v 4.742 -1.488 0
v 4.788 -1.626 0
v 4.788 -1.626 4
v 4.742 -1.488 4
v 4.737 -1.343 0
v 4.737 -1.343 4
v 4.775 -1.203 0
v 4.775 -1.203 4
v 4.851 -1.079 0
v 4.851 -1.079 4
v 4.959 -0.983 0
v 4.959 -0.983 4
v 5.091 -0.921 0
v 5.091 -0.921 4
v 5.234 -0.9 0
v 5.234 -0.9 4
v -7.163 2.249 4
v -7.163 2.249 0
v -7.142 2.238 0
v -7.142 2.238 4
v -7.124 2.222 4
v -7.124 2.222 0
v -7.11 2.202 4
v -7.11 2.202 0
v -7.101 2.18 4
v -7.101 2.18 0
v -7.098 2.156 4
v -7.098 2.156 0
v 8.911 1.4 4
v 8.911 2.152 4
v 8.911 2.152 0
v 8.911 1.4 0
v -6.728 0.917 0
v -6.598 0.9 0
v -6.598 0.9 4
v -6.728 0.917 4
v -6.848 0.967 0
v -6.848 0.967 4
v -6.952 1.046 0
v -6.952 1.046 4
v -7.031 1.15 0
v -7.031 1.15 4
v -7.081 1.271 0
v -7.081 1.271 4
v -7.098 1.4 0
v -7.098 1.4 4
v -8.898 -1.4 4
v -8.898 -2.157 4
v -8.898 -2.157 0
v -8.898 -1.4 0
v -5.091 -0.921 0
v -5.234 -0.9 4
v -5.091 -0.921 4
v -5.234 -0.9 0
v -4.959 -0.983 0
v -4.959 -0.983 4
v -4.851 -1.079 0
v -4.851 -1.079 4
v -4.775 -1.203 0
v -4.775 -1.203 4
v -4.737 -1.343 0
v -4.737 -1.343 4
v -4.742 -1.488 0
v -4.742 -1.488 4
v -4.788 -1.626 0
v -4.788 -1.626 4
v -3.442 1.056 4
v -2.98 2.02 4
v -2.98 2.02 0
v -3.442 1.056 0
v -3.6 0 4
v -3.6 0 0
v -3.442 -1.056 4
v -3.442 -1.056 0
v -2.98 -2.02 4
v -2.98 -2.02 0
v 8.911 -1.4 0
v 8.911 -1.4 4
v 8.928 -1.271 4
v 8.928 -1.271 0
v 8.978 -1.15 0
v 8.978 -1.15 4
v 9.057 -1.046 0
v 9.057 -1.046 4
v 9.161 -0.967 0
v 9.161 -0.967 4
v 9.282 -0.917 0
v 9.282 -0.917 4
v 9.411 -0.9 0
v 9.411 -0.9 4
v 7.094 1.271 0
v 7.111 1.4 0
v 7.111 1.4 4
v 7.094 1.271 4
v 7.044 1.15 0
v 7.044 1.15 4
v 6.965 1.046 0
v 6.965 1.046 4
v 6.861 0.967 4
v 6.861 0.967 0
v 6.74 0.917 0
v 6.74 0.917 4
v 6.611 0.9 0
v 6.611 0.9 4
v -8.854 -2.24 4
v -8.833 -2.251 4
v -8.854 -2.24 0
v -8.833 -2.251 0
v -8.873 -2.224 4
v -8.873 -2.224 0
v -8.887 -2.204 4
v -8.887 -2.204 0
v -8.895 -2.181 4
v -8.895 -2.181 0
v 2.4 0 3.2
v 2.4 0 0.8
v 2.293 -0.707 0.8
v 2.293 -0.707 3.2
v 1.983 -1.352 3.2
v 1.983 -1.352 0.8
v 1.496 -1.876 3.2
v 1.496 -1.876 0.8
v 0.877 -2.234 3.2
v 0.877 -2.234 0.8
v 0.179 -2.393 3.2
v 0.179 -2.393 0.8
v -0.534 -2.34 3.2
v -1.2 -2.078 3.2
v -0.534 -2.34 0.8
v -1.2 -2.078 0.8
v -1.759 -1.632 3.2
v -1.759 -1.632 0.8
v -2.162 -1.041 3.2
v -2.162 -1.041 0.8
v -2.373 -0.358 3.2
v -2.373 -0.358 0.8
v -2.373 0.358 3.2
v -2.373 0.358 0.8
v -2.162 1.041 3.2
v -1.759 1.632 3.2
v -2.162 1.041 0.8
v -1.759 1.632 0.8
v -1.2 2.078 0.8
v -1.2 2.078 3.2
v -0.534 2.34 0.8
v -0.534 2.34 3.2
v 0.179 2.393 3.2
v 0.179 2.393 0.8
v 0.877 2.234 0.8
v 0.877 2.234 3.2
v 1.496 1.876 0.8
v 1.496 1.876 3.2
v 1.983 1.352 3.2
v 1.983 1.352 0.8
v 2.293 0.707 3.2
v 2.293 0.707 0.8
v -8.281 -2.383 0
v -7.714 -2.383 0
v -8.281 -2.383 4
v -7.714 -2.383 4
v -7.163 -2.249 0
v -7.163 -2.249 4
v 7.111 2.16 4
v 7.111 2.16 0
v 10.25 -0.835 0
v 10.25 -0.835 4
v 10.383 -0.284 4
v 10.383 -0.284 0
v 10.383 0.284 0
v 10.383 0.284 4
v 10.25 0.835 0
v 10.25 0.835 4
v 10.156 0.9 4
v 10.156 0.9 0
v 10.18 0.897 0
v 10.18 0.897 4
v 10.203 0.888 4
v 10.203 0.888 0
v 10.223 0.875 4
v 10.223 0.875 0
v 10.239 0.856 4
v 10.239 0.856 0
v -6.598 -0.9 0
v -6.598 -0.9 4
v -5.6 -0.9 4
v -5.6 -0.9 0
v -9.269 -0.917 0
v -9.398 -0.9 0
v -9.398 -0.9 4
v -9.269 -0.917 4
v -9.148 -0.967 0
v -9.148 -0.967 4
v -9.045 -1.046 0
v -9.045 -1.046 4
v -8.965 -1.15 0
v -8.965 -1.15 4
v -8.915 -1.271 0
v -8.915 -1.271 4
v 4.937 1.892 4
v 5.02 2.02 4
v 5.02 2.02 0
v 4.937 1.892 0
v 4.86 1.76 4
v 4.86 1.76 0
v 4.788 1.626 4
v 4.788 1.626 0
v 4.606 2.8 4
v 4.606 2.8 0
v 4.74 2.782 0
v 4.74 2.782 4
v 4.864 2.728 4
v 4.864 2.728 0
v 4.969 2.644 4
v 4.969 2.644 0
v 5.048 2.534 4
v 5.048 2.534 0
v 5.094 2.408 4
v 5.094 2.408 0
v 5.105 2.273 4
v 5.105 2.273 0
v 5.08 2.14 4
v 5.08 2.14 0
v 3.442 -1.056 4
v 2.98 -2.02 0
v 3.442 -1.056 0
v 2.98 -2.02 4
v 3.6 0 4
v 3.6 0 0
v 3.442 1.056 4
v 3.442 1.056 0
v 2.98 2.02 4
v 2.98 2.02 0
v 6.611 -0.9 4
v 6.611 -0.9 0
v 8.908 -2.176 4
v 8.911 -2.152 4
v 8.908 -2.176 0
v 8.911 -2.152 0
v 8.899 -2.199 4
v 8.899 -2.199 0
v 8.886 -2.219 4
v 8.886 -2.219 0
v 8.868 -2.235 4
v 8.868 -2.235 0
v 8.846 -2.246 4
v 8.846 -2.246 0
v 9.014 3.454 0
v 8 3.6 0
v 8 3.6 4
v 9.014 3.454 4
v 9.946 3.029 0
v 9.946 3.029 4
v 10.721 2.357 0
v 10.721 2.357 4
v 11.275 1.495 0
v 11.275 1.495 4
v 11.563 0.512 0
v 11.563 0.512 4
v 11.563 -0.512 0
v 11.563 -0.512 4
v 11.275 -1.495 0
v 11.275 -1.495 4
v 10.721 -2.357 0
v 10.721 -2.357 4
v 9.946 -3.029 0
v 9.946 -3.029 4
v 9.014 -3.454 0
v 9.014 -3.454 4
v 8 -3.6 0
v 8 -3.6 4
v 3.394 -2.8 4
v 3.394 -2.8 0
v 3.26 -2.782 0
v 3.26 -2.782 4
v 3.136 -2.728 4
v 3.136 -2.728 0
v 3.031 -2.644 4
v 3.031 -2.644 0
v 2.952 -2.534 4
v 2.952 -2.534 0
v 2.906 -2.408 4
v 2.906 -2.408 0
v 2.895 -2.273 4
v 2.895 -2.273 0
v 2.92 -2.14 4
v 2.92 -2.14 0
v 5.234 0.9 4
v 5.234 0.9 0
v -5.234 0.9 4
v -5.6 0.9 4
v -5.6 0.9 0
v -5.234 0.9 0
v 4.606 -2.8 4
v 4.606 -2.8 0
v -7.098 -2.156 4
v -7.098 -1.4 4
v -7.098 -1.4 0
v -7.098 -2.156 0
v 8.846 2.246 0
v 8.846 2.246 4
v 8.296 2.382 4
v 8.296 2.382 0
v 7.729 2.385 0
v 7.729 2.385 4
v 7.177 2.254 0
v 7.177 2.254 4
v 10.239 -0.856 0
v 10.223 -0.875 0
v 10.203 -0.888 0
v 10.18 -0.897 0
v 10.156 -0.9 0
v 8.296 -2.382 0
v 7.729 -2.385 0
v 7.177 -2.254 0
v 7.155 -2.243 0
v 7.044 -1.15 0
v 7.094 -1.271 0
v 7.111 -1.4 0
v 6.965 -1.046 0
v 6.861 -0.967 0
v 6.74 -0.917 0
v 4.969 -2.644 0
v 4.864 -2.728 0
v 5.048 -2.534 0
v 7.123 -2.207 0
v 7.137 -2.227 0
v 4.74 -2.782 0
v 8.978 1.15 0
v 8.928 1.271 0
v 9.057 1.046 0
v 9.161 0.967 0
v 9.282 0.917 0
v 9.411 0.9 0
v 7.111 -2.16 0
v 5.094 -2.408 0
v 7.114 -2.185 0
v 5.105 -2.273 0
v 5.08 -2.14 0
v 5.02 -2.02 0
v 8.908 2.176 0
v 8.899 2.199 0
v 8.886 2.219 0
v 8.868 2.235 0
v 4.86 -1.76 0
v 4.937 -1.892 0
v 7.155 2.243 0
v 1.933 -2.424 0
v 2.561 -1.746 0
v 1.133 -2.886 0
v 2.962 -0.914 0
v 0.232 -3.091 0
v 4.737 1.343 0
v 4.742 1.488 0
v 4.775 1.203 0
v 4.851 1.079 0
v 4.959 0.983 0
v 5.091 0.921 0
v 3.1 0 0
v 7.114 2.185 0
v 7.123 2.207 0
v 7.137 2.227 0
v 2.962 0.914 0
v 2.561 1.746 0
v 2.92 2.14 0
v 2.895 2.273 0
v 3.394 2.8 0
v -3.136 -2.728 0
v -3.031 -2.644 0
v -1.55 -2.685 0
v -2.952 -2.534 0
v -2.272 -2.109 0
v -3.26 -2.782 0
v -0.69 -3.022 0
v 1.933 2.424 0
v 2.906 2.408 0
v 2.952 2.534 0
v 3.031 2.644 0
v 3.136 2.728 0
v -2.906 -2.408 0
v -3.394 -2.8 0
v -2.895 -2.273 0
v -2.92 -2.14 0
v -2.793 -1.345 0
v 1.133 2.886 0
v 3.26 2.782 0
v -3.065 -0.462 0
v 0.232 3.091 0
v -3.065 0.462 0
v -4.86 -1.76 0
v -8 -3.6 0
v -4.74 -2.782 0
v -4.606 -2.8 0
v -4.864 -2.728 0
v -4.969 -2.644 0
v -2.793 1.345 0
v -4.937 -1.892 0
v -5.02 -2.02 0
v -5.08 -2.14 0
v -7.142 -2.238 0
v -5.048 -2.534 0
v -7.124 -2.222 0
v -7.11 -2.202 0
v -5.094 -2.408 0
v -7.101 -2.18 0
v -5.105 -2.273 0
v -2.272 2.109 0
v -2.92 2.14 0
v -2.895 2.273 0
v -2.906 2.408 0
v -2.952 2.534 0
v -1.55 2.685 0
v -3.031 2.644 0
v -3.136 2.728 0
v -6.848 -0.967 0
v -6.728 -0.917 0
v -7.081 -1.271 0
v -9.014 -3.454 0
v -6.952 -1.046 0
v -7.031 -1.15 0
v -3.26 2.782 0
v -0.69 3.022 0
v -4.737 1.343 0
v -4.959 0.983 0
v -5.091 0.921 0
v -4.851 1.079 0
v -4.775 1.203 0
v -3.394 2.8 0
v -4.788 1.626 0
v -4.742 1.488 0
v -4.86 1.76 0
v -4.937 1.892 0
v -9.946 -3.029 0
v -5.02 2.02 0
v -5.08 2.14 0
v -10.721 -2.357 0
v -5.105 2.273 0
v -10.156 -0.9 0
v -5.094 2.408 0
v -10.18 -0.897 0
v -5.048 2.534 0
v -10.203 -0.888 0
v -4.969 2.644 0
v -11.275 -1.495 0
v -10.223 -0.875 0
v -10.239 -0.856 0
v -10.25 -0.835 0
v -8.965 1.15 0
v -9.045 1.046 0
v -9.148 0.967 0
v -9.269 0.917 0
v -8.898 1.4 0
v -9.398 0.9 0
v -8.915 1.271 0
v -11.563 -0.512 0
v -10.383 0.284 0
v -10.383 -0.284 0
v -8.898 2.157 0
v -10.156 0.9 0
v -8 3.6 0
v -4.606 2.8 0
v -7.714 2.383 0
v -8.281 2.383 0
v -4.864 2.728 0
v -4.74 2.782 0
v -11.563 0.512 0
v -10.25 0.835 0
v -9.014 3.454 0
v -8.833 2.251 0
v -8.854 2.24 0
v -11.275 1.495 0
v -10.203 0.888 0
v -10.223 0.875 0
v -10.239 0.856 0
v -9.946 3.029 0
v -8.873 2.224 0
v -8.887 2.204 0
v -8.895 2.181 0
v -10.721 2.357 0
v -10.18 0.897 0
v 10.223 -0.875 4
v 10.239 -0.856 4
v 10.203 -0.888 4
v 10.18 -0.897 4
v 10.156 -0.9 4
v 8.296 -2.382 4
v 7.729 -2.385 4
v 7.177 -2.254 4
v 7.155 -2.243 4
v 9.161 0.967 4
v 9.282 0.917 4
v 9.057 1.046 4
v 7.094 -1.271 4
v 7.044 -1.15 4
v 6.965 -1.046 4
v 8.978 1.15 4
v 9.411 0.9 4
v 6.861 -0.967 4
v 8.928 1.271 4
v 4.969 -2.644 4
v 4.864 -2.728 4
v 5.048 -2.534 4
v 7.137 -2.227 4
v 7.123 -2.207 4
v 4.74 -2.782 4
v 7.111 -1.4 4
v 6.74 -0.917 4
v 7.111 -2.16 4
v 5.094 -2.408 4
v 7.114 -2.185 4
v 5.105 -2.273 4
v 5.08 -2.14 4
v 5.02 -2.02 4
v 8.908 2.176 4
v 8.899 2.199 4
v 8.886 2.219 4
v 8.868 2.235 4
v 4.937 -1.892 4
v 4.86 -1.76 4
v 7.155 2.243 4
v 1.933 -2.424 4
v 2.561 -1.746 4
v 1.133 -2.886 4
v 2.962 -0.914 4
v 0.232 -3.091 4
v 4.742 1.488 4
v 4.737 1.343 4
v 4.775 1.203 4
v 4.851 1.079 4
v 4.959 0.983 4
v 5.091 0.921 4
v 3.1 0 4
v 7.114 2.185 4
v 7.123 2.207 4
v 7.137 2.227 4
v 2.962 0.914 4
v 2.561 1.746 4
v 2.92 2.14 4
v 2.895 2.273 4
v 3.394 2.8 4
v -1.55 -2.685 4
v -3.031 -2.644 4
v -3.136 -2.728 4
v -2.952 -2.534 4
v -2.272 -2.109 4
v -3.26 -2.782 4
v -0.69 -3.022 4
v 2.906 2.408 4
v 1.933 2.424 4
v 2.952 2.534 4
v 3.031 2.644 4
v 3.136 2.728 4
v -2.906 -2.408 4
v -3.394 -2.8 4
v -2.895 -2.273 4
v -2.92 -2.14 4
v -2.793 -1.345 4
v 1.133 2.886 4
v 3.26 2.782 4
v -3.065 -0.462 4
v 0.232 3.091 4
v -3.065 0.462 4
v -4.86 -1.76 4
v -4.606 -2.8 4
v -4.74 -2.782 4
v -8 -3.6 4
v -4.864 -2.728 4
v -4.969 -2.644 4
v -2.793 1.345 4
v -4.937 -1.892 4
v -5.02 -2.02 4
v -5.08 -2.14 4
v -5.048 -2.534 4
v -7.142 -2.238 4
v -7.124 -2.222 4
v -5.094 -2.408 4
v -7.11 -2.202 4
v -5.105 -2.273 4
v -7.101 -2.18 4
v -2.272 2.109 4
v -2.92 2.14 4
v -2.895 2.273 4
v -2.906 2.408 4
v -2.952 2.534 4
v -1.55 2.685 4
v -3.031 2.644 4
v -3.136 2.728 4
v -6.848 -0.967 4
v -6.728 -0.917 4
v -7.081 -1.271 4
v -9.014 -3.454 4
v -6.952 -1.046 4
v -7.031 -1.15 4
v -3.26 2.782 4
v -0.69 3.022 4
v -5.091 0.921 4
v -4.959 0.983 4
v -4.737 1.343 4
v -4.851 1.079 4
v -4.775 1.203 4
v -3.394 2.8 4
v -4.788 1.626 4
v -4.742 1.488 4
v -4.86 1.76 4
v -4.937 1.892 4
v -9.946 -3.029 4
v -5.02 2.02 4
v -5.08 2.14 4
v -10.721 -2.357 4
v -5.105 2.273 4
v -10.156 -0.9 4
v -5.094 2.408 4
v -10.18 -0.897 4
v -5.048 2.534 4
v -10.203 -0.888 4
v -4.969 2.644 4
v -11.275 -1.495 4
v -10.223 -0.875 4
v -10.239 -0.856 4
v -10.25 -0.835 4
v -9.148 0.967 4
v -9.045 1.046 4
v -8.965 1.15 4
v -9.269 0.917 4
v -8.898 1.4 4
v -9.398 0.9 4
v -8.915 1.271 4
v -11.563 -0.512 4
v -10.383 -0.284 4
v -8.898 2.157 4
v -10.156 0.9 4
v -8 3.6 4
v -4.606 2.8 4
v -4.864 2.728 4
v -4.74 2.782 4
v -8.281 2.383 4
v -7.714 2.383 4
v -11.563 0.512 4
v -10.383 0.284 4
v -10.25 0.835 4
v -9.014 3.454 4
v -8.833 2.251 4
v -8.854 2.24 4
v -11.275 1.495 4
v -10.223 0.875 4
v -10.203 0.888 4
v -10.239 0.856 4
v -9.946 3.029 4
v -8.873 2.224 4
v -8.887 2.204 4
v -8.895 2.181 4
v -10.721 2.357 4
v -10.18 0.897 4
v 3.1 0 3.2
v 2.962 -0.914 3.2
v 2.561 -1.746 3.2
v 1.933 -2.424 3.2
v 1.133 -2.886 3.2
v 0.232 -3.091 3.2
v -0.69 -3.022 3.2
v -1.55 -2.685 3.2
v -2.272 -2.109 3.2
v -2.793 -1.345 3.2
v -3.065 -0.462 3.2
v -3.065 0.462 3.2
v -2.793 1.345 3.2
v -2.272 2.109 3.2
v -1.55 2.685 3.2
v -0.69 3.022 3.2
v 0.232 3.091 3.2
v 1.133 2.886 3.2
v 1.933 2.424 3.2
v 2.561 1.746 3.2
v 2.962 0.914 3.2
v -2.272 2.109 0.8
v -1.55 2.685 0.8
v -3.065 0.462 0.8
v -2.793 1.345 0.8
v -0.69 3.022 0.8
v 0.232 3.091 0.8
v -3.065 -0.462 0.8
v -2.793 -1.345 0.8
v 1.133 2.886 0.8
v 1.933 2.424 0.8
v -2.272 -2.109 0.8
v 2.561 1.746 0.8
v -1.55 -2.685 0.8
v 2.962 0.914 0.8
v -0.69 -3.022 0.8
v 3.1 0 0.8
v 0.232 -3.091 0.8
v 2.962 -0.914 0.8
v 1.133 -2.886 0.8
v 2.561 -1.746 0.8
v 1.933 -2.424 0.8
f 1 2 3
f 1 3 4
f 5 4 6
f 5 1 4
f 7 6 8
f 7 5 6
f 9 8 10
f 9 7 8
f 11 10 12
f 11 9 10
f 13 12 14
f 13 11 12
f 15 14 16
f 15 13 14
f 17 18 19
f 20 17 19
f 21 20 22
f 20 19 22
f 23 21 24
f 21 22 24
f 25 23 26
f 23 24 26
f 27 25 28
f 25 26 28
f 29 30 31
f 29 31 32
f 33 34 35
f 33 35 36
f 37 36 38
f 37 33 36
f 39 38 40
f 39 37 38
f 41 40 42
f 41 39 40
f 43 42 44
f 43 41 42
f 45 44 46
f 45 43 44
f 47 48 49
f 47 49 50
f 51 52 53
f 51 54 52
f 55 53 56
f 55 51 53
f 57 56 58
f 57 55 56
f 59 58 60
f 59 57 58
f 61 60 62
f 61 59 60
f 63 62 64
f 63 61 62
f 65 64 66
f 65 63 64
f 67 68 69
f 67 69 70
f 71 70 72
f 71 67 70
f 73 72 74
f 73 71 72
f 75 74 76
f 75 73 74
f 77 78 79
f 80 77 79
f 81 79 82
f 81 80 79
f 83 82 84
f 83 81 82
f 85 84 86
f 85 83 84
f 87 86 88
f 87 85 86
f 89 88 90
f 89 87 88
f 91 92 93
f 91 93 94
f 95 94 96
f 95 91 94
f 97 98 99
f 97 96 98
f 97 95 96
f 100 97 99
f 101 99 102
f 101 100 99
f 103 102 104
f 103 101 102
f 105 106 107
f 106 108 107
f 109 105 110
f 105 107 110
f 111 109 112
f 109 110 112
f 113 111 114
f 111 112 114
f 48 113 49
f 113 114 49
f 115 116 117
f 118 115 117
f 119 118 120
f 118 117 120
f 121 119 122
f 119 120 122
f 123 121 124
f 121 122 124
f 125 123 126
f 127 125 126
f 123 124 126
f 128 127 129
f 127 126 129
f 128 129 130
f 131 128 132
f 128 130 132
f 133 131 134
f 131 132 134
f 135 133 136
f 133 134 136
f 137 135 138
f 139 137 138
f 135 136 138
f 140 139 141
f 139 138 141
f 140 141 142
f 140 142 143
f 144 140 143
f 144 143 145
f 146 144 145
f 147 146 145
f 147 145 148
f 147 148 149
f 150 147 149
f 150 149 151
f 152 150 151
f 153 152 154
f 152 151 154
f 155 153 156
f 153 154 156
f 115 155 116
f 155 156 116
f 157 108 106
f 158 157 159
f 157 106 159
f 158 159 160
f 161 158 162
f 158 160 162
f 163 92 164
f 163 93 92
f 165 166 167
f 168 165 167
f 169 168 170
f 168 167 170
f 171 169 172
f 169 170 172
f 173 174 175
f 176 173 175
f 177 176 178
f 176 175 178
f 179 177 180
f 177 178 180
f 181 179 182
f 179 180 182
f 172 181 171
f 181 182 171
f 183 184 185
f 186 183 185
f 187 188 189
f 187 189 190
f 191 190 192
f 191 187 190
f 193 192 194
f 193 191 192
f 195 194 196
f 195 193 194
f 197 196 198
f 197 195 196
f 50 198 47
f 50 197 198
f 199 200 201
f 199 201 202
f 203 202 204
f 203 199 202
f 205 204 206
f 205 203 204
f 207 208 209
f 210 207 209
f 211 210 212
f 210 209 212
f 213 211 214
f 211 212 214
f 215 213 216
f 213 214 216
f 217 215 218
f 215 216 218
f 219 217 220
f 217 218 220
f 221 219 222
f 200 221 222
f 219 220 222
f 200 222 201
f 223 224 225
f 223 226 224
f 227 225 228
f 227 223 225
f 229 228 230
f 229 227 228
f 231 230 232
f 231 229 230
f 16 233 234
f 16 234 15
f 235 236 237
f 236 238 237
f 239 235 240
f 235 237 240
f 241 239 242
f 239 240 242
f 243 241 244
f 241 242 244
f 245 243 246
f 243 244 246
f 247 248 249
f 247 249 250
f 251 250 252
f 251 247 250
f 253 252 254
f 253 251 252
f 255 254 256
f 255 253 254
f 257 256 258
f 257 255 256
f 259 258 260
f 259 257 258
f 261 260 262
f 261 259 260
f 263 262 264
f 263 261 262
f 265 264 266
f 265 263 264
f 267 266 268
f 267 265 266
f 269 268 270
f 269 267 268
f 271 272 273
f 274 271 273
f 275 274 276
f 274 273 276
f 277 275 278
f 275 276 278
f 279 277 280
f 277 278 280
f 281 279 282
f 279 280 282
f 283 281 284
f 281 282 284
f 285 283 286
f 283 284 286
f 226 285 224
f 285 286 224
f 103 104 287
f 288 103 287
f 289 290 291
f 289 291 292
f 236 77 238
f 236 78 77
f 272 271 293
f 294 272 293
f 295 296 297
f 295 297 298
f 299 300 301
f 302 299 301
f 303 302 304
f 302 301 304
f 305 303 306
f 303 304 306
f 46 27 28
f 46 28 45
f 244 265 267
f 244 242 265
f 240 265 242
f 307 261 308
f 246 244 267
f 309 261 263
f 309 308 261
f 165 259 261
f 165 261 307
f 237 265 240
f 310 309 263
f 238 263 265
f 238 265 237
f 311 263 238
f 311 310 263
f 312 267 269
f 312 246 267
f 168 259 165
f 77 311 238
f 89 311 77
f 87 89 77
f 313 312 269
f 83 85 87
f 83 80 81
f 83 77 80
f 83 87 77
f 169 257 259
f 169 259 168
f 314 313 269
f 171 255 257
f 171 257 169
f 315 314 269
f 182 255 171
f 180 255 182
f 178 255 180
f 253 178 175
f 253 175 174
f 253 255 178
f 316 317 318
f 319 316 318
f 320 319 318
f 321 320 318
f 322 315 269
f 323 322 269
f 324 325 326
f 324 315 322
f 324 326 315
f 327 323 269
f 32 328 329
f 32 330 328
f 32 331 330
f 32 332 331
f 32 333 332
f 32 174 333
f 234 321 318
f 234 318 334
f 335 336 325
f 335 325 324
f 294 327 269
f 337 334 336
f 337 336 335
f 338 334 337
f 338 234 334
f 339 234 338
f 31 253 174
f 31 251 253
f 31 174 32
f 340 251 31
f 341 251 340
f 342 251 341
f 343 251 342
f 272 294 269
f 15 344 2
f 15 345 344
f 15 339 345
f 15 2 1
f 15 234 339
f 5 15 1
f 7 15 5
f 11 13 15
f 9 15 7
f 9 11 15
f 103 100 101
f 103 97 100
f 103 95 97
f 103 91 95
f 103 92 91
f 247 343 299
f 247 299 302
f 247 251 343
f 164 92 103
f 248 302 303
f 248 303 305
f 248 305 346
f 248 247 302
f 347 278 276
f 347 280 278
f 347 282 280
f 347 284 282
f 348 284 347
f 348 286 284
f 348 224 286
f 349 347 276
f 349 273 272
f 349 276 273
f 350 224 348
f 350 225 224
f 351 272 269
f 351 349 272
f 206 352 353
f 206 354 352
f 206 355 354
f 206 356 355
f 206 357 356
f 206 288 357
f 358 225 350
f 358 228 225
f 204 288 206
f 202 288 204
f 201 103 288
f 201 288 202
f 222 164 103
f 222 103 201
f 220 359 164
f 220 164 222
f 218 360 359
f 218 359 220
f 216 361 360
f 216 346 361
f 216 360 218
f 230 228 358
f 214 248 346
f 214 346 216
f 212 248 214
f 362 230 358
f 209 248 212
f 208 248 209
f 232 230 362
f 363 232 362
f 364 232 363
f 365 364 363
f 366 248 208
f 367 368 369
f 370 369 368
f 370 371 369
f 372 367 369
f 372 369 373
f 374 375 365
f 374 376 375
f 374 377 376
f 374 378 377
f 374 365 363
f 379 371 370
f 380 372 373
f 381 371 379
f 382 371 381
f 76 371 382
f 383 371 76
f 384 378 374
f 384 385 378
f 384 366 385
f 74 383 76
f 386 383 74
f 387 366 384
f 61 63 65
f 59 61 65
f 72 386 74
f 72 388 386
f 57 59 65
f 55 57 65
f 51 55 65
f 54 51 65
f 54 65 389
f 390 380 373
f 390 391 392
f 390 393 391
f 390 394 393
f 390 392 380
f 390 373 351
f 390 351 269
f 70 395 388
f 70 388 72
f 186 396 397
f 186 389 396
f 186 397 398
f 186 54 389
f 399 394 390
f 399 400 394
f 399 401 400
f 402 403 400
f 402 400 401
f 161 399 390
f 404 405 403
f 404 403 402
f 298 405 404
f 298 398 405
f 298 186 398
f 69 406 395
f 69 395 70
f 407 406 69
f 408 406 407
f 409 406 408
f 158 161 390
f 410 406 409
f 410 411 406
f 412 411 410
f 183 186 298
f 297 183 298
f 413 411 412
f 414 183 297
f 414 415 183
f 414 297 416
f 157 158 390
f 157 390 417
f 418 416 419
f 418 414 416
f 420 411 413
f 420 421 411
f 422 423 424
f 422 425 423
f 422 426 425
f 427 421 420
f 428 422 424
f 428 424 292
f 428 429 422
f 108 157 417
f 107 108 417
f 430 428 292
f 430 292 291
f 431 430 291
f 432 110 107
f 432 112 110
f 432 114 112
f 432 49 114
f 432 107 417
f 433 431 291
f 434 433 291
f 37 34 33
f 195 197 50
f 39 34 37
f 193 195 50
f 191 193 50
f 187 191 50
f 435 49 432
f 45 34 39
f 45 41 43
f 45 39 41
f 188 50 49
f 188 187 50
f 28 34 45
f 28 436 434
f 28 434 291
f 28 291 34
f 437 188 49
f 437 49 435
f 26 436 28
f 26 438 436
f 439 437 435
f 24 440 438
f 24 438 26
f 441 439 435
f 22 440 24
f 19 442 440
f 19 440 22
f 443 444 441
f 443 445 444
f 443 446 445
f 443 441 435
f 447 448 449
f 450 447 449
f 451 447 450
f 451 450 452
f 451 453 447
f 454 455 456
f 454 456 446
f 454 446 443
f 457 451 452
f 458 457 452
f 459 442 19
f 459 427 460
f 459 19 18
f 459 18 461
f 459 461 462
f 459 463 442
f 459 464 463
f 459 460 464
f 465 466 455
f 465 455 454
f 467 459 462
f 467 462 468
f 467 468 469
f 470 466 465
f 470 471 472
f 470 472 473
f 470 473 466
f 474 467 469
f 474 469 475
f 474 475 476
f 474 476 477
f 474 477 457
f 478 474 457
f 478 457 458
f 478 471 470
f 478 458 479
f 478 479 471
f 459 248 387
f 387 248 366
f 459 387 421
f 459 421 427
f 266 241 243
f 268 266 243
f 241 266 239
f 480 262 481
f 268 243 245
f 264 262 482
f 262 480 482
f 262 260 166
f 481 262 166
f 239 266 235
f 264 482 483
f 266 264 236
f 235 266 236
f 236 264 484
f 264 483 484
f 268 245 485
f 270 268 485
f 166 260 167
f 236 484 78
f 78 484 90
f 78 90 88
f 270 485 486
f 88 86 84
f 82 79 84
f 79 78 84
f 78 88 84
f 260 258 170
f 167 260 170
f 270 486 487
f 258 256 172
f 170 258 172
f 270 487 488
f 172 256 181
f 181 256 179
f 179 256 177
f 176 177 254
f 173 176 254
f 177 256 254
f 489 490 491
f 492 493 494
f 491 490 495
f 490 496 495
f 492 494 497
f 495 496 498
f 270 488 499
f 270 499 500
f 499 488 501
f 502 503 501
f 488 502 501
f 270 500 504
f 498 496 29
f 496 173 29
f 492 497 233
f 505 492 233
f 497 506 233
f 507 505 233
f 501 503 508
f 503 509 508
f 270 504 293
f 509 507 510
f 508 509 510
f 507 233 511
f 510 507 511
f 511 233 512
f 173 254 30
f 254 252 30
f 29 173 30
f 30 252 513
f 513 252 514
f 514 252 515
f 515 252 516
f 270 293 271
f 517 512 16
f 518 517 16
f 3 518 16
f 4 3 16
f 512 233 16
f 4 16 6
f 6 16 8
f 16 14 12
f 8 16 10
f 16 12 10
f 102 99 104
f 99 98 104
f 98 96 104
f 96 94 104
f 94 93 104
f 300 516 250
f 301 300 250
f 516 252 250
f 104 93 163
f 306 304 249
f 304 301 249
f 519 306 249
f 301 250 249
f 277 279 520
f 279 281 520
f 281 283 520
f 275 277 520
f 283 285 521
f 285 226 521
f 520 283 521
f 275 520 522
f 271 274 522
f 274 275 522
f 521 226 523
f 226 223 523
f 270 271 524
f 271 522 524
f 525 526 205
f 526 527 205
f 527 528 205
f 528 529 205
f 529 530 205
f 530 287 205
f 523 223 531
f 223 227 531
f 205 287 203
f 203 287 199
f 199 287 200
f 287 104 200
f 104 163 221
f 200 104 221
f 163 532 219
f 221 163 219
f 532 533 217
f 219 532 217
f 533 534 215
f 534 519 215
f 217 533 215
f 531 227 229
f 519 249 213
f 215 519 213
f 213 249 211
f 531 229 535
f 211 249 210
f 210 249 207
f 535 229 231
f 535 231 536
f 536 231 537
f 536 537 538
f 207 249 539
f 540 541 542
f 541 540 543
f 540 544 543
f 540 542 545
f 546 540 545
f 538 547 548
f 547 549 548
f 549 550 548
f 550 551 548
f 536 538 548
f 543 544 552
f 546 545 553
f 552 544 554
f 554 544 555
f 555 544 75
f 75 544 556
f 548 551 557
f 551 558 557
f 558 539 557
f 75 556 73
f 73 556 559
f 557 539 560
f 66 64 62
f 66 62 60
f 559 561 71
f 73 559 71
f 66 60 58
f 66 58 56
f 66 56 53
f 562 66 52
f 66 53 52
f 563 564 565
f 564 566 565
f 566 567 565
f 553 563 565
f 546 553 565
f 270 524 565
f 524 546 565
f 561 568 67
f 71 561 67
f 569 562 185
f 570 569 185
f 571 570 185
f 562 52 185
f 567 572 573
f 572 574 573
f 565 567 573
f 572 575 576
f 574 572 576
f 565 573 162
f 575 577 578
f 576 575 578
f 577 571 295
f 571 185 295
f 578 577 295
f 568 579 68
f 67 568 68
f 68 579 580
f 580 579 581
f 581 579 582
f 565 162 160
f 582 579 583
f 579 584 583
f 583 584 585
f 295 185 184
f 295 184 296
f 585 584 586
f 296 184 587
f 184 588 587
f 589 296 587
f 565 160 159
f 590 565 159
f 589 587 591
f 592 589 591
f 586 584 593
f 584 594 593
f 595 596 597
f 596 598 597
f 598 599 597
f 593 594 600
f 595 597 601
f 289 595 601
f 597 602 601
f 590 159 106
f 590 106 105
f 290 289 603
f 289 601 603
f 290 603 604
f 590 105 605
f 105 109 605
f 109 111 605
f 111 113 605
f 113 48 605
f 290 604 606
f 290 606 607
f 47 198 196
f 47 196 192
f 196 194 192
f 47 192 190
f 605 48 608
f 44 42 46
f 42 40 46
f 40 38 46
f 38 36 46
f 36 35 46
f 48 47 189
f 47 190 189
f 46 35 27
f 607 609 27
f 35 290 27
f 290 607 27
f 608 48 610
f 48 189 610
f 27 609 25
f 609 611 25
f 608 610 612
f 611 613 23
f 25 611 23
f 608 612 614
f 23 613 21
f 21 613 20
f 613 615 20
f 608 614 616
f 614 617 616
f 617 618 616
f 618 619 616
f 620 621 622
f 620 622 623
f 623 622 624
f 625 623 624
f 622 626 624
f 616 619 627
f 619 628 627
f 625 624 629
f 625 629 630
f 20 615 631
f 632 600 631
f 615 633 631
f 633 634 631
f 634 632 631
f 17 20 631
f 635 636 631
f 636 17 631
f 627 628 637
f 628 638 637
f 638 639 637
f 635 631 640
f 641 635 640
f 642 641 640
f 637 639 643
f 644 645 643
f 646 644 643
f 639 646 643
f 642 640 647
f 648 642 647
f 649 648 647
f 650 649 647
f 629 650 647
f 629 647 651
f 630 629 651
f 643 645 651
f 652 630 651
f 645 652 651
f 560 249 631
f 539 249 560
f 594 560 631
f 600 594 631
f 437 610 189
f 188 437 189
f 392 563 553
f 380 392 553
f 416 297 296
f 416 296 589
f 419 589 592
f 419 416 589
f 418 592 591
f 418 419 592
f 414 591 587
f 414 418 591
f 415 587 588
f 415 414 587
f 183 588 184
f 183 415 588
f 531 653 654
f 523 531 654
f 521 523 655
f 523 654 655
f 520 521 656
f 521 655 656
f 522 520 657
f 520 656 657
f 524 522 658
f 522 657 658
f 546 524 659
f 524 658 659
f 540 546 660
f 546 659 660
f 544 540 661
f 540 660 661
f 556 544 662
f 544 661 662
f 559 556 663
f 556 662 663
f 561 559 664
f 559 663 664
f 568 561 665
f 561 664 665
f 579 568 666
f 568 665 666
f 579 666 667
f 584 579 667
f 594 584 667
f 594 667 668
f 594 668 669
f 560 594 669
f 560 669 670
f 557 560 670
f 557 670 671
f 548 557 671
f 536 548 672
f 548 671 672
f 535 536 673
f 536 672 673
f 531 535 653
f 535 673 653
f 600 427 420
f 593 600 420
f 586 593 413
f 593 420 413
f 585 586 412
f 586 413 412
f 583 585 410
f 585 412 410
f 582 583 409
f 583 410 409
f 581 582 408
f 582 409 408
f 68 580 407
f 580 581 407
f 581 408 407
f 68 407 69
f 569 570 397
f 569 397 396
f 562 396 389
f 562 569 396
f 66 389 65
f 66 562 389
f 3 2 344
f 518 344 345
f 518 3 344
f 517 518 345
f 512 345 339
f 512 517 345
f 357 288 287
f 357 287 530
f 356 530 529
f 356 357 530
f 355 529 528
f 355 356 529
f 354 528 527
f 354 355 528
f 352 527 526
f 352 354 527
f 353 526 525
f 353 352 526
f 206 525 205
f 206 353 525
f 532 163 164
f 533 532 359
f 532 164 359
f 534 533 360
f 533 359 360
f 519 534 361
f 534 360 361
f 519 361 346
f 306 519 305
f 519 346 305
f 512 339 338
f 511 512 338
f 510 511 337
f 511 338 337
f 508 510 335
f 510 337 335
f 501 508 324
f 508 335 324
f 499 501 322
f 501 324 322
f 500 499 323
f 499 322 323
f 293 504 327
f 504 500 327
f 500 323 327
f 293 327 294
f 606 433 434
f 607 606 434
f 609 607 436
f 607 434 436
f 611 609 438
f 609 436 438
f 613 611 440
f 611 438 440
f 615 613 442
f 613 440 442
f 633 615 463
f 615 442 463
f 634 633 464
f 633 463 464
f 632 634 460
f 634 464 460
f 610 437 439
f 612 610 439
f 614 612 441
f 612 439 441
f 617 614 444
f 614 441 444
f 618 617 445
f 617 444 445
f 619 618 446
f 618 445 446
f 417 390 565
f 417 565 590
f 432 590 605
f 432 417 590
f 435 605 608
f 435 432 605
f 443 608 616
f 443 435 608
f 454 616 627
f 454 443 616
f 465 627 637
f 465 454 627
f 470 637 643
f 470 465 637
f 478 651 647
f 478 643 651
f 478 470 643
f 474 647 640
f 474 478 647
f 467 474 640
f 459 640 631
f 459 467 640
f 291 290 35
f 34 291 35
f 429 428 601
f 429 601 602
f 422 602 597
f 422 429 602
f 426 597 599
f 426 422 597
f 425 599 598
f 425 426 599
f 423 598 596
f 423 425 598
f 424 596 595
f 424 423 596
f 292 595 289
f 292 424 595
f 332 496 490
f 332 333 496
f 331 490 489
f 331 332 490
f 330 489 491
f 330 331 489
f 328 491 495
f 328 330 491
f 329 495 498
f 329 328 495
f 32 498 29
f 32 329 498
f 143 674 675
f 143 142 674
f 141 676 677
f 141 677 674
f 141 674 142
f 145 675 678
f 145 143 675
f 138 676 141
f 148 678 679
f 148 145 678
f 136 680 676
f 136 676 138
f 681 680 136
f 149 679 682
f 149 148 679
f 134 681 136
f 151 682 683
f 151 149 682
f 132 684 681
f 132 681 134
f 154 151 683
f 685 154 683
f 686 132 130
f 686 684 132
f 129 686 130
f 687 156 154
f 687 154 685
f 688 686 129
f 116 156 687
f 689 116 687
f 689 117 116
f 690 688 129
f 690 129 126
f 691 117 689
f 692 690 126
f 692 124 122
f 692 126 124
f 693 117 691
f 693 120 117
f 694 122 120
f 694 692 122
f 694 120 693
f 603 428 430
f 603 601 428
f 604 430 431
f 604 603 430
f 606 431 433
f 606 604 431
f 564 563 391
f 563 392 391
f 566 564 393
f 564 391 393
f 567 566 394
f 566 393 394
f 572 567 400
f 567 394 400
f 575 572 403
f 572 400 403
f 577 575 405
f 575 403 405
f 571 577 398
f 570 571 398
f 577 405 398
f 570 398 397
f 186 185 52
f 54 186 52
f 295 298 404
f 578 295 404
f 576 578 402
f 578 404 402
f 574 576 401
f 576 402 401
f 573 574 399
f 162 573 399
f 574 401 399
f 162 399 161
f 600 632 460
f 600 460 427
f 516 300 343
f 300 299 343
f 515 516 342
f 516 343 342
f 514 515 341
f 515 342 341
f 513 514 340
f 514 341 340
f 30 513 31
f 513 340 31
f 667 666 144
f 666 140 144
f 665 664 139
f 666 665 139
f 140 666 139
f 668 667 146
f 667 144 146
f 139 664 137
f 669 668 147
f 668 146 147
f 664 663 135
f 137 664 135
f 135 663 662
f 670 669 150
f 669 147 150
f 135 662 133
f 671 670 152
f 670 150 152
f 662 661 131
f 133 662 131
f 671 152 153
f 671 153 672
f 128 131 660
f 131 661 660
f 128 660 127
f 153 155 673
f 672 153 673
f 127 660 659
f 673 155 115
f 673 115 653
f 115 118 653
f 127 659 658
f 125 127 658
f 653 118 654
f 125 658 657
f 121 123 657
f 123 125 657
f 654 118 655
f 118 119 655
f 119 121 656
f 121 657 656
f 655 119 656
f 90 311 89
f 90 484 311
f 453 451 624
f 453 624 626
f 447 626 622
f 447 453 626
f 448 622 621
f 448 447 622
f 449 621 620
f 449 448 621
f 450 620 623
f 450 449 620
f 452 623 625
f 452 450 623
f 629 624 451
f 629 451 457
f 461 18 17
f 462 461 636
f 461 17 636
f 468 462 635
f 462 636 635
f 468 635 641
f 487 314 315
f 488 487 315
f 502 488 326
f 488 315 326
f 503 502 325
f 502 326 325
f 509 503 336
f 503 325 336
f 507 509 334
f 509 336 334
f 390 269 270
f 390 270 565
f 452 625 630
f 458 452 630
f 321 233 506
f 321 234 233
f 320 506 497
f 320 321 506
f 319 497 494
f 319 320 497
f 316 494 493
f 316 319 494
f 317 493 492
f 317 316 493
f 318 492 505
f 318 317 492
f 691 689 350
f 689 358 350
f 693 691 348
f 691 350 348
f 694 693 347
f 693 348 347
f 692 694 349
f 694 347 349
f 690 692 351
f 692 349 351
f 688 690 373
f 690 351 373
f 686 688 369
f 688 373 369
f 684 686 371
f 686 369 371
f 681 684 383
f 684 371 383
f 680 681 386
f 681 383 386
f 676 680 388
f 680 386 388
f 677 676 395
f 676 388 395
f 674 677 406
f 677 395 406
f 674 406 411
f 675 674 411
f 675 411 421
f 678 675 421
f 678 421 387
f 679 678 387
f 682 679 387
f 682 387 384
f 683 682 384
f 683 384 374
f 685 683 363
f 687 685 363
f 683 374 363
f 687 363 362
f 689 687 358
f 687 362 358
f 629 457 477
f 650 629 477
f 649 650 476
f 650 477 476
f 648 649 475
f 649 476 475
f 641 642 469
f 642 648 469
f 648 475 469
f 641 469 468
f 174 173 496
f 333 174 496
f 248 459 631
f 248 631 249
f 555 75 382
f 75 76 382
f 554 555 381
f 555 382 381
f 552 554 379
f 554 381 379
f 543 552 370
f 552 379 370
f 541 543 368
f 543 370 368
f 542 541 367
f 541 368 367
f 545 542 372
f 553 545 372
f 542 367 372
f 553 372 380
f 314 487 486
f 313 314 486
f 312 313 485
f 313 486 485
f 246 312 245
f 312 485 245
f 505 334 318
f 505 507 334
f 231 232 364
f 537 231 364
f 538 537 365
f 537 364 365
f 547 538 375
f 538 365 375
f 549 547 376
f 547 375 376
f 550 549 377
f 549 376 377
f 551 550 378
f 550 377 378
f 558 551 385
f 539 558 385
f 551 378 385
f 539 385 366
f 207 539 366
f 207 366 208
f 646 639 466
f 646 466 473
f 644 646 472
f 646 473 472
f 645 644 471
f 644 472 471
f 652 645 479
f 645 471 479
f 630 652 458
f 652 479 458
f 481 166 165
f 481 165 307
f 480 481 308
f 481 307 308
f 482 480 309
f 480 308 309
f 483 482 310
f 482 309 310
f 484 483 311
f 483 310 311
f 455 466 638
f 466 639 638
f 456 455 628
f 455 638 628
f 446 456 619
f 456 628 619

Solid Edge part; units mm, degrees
sketch "Sketch1" plane through (0, 0, 0) normal (0, 0, 1) x (1, 0, 0)
  line L0 (0, 0) -> (0, 3.6)
  line L1 (0, 3.6) -> (8, 3.6)
  line L2 (8, -3.6) -> (0, -3.6)
  line L3 (0, -3.6) -> (0, 0)
  arc A0 (8, 3.6) -> (8, -3.6) centre (8, 0) cw
extrude "ExtrudedProtrusion_1" add sketch "Sketch1" along normal blind 4
mirror "Mirror1" about plane through (0, 0, 0) normal (-1, 0, 0) of "ExtrudedProtrusion_1"
sketch "Sketch2" plane through (0, 0, 0) normal (0, -1, 0) x (1, 0, 0)
  line L0 (0, 0) -> (0, 4)
  line L1 (0, 4) -> (3.1, 4)
  line L2 (3.1, 4) -> (3.1, 3.2)
  line L3 (3.1, 3.2) -> (2.4, 3.2)
  line L4 (2.4, 3.2) -> (2.4, 0.8)
  line L5 (2.4, 0.8) -> (3.1, 0.8)
  line L6 (3.1, 0.8) -> (3.1, 0)
  line L7 (3.1, 0) -> (0, 0)
revolve "RevolvedCutout1" cut sketch "Sketch2" angle 360 about axis through (0, 0, 54) along (0, 0, -1)
sketch "Sketch3" plane through (0, 0, 4) normal (0, 0, 1) x (1, 0, 0)
  line L0 (-5.7373, 2.8) -> (-2.2627, 2.8)
  line L1 (-5.7373, -2.8) -> (-2.2627, -2.8)
  arc A0 (-4.5143, -0.9) -> (-5.7373, -2.8) centre (-8, 0) cw
  line L2 (-5.6, -0.9) -> (-4.5143, -0.9)
  line L3 (-7.0981, -0.9) -> (-5.6, -0.9)
  line L4 (-7.0981, -0.9) -> (-7.0981, -2.2241)
  arc A1 (-7.0981, -2.2241) -> (-8.8981, -2.2256) centre (-8, 0) cw
  line L5 (-8.8981, -2.2256) -> (-8.8981, -0.9)
  line L6 (-10.2249, -0.9) -> (-8.8981, -0.9)
  arc A2 (-10.2249, -0.9) -> (-10.2249, 0.9) centre (-8, 0) cw
  line L7 (-8.8981, 0.9) -> (-10.2249, 0.9)
  line L8 (-8.8981, 0.9) -> (-8.8981, 2.2256)
  line L9 (-7.0981, 2.2241) -> (-7.0981, 0.9)
  line L10 (-5.6, 0.9) -> (-7.0981, 0.9)
  line L11 (-5.6, 0.9) -> (-4.5143, 0.9)
  arc A3 (-4.5143, 0.9) -> (-5.7373, 2.8) centre (-8, 0) ccw
  arc A4 (-8.8981, 2.2256) -> (-7.0981, 2.2241) centre (-8, 0) cw
  arc A5 (-2.2627, 2.8) -> (-2.2627, -2.8) centre (0, 0) ccw
  line L12 (2.2627, -2.8) -> (5.7373, -2.8)
  arc A6 (5.7373, -2.8) -> (4.5143, -0.9) centre (8, 0) cw
  line L13 (7.111, -0.9) -> (4.5143, -0.9)
  line L14 (7.111, -2.2293) -> (7.111, -0.9)
  arc A7 (8.911, -2.2204) -> (7.111, -2.2293) centre (8, 0) cw
  line L15 (8.911, -0.9) -> (8.911, -2.2204)
  line L16 (10.2249, -0.9) -> (8.911, -0.9)
  arc A8 (10.2249, 0.9) -> (10.2249, -0.9) centre (8, 0) cw
  line L17 (10.2249, 0.9) -> (8.911, 0.9)
  line L18 (8.911, 2.2204) -> (8.911, 0.9)
  line L19 (7.111, 0.9) -> (7.111, 2.2293)
  line L20 (7.111, 0.9) -> (4.5143, 0.9)
  line L21 (2.2627, 2.8) -> (5.7373, 2.8)
  arc A9 (2.2627, 2.8) -> (2.2627, -2.8) centre (0, 0) cw
  arc A10 (5.7373, 2.8) -> (4.5143, 0.9) centre (8, 0) ccw
  arc A11 (7.111, 2.2293) -> (8.911, 2.2204) centre (8, 0) cw
  dimension "D1" = 0.8
  dimension "D2" = 0.8
  dimension "D3" = 0.8
extrude "ExtrudedCutout_1" cut sketch "Sketch3" against normal blind 30
fillet "Round_1" radius 0.5 20 edges at (-5.7373, 2.8, 2) (-2.2627, 2.8, 2) (5.7373, 2.8, 2) (-7.0981, 0.9, 2) (-8.8981, 0.9, 2) (-8.8981, -0.9, 2) (-7.0981, -0.9, 2) (-4.5143, -0.9, 2) (-4.5143, 0.9, 2) (-2.2627, -2.8, 2) (-5.7373, -2.8, 2) (7.111, -0.9, 2) (7.111, 0.9, 2) (8.911, 0.9, 2) (8.911, -0.9, 2) (4.5143, 0.9, 2) (4.5143, -0.9, 2) (2.2627, -2.8, 2) (5.7373, -2.8, 2) (2.2627, 2.8, 2)
fillet "Round_2" radius 0.1 12 edges at (-8.8981, 2.2256, 2) (-7.0981, 2.2241, 2) (-10.2249, 0.9, 2) (-10.2249, -0.9, 2) (-8.8981, -2.2256, 2) (-7.0981, -2.2241, 2) (8.911, -2.2204, 2) (10.2249, -0.9, 2) (10.2249, 0.9, 2) (8.911, 2.2204, 2) (7.111, -2.2293, 2) (7.111, 2.2293, 2)
